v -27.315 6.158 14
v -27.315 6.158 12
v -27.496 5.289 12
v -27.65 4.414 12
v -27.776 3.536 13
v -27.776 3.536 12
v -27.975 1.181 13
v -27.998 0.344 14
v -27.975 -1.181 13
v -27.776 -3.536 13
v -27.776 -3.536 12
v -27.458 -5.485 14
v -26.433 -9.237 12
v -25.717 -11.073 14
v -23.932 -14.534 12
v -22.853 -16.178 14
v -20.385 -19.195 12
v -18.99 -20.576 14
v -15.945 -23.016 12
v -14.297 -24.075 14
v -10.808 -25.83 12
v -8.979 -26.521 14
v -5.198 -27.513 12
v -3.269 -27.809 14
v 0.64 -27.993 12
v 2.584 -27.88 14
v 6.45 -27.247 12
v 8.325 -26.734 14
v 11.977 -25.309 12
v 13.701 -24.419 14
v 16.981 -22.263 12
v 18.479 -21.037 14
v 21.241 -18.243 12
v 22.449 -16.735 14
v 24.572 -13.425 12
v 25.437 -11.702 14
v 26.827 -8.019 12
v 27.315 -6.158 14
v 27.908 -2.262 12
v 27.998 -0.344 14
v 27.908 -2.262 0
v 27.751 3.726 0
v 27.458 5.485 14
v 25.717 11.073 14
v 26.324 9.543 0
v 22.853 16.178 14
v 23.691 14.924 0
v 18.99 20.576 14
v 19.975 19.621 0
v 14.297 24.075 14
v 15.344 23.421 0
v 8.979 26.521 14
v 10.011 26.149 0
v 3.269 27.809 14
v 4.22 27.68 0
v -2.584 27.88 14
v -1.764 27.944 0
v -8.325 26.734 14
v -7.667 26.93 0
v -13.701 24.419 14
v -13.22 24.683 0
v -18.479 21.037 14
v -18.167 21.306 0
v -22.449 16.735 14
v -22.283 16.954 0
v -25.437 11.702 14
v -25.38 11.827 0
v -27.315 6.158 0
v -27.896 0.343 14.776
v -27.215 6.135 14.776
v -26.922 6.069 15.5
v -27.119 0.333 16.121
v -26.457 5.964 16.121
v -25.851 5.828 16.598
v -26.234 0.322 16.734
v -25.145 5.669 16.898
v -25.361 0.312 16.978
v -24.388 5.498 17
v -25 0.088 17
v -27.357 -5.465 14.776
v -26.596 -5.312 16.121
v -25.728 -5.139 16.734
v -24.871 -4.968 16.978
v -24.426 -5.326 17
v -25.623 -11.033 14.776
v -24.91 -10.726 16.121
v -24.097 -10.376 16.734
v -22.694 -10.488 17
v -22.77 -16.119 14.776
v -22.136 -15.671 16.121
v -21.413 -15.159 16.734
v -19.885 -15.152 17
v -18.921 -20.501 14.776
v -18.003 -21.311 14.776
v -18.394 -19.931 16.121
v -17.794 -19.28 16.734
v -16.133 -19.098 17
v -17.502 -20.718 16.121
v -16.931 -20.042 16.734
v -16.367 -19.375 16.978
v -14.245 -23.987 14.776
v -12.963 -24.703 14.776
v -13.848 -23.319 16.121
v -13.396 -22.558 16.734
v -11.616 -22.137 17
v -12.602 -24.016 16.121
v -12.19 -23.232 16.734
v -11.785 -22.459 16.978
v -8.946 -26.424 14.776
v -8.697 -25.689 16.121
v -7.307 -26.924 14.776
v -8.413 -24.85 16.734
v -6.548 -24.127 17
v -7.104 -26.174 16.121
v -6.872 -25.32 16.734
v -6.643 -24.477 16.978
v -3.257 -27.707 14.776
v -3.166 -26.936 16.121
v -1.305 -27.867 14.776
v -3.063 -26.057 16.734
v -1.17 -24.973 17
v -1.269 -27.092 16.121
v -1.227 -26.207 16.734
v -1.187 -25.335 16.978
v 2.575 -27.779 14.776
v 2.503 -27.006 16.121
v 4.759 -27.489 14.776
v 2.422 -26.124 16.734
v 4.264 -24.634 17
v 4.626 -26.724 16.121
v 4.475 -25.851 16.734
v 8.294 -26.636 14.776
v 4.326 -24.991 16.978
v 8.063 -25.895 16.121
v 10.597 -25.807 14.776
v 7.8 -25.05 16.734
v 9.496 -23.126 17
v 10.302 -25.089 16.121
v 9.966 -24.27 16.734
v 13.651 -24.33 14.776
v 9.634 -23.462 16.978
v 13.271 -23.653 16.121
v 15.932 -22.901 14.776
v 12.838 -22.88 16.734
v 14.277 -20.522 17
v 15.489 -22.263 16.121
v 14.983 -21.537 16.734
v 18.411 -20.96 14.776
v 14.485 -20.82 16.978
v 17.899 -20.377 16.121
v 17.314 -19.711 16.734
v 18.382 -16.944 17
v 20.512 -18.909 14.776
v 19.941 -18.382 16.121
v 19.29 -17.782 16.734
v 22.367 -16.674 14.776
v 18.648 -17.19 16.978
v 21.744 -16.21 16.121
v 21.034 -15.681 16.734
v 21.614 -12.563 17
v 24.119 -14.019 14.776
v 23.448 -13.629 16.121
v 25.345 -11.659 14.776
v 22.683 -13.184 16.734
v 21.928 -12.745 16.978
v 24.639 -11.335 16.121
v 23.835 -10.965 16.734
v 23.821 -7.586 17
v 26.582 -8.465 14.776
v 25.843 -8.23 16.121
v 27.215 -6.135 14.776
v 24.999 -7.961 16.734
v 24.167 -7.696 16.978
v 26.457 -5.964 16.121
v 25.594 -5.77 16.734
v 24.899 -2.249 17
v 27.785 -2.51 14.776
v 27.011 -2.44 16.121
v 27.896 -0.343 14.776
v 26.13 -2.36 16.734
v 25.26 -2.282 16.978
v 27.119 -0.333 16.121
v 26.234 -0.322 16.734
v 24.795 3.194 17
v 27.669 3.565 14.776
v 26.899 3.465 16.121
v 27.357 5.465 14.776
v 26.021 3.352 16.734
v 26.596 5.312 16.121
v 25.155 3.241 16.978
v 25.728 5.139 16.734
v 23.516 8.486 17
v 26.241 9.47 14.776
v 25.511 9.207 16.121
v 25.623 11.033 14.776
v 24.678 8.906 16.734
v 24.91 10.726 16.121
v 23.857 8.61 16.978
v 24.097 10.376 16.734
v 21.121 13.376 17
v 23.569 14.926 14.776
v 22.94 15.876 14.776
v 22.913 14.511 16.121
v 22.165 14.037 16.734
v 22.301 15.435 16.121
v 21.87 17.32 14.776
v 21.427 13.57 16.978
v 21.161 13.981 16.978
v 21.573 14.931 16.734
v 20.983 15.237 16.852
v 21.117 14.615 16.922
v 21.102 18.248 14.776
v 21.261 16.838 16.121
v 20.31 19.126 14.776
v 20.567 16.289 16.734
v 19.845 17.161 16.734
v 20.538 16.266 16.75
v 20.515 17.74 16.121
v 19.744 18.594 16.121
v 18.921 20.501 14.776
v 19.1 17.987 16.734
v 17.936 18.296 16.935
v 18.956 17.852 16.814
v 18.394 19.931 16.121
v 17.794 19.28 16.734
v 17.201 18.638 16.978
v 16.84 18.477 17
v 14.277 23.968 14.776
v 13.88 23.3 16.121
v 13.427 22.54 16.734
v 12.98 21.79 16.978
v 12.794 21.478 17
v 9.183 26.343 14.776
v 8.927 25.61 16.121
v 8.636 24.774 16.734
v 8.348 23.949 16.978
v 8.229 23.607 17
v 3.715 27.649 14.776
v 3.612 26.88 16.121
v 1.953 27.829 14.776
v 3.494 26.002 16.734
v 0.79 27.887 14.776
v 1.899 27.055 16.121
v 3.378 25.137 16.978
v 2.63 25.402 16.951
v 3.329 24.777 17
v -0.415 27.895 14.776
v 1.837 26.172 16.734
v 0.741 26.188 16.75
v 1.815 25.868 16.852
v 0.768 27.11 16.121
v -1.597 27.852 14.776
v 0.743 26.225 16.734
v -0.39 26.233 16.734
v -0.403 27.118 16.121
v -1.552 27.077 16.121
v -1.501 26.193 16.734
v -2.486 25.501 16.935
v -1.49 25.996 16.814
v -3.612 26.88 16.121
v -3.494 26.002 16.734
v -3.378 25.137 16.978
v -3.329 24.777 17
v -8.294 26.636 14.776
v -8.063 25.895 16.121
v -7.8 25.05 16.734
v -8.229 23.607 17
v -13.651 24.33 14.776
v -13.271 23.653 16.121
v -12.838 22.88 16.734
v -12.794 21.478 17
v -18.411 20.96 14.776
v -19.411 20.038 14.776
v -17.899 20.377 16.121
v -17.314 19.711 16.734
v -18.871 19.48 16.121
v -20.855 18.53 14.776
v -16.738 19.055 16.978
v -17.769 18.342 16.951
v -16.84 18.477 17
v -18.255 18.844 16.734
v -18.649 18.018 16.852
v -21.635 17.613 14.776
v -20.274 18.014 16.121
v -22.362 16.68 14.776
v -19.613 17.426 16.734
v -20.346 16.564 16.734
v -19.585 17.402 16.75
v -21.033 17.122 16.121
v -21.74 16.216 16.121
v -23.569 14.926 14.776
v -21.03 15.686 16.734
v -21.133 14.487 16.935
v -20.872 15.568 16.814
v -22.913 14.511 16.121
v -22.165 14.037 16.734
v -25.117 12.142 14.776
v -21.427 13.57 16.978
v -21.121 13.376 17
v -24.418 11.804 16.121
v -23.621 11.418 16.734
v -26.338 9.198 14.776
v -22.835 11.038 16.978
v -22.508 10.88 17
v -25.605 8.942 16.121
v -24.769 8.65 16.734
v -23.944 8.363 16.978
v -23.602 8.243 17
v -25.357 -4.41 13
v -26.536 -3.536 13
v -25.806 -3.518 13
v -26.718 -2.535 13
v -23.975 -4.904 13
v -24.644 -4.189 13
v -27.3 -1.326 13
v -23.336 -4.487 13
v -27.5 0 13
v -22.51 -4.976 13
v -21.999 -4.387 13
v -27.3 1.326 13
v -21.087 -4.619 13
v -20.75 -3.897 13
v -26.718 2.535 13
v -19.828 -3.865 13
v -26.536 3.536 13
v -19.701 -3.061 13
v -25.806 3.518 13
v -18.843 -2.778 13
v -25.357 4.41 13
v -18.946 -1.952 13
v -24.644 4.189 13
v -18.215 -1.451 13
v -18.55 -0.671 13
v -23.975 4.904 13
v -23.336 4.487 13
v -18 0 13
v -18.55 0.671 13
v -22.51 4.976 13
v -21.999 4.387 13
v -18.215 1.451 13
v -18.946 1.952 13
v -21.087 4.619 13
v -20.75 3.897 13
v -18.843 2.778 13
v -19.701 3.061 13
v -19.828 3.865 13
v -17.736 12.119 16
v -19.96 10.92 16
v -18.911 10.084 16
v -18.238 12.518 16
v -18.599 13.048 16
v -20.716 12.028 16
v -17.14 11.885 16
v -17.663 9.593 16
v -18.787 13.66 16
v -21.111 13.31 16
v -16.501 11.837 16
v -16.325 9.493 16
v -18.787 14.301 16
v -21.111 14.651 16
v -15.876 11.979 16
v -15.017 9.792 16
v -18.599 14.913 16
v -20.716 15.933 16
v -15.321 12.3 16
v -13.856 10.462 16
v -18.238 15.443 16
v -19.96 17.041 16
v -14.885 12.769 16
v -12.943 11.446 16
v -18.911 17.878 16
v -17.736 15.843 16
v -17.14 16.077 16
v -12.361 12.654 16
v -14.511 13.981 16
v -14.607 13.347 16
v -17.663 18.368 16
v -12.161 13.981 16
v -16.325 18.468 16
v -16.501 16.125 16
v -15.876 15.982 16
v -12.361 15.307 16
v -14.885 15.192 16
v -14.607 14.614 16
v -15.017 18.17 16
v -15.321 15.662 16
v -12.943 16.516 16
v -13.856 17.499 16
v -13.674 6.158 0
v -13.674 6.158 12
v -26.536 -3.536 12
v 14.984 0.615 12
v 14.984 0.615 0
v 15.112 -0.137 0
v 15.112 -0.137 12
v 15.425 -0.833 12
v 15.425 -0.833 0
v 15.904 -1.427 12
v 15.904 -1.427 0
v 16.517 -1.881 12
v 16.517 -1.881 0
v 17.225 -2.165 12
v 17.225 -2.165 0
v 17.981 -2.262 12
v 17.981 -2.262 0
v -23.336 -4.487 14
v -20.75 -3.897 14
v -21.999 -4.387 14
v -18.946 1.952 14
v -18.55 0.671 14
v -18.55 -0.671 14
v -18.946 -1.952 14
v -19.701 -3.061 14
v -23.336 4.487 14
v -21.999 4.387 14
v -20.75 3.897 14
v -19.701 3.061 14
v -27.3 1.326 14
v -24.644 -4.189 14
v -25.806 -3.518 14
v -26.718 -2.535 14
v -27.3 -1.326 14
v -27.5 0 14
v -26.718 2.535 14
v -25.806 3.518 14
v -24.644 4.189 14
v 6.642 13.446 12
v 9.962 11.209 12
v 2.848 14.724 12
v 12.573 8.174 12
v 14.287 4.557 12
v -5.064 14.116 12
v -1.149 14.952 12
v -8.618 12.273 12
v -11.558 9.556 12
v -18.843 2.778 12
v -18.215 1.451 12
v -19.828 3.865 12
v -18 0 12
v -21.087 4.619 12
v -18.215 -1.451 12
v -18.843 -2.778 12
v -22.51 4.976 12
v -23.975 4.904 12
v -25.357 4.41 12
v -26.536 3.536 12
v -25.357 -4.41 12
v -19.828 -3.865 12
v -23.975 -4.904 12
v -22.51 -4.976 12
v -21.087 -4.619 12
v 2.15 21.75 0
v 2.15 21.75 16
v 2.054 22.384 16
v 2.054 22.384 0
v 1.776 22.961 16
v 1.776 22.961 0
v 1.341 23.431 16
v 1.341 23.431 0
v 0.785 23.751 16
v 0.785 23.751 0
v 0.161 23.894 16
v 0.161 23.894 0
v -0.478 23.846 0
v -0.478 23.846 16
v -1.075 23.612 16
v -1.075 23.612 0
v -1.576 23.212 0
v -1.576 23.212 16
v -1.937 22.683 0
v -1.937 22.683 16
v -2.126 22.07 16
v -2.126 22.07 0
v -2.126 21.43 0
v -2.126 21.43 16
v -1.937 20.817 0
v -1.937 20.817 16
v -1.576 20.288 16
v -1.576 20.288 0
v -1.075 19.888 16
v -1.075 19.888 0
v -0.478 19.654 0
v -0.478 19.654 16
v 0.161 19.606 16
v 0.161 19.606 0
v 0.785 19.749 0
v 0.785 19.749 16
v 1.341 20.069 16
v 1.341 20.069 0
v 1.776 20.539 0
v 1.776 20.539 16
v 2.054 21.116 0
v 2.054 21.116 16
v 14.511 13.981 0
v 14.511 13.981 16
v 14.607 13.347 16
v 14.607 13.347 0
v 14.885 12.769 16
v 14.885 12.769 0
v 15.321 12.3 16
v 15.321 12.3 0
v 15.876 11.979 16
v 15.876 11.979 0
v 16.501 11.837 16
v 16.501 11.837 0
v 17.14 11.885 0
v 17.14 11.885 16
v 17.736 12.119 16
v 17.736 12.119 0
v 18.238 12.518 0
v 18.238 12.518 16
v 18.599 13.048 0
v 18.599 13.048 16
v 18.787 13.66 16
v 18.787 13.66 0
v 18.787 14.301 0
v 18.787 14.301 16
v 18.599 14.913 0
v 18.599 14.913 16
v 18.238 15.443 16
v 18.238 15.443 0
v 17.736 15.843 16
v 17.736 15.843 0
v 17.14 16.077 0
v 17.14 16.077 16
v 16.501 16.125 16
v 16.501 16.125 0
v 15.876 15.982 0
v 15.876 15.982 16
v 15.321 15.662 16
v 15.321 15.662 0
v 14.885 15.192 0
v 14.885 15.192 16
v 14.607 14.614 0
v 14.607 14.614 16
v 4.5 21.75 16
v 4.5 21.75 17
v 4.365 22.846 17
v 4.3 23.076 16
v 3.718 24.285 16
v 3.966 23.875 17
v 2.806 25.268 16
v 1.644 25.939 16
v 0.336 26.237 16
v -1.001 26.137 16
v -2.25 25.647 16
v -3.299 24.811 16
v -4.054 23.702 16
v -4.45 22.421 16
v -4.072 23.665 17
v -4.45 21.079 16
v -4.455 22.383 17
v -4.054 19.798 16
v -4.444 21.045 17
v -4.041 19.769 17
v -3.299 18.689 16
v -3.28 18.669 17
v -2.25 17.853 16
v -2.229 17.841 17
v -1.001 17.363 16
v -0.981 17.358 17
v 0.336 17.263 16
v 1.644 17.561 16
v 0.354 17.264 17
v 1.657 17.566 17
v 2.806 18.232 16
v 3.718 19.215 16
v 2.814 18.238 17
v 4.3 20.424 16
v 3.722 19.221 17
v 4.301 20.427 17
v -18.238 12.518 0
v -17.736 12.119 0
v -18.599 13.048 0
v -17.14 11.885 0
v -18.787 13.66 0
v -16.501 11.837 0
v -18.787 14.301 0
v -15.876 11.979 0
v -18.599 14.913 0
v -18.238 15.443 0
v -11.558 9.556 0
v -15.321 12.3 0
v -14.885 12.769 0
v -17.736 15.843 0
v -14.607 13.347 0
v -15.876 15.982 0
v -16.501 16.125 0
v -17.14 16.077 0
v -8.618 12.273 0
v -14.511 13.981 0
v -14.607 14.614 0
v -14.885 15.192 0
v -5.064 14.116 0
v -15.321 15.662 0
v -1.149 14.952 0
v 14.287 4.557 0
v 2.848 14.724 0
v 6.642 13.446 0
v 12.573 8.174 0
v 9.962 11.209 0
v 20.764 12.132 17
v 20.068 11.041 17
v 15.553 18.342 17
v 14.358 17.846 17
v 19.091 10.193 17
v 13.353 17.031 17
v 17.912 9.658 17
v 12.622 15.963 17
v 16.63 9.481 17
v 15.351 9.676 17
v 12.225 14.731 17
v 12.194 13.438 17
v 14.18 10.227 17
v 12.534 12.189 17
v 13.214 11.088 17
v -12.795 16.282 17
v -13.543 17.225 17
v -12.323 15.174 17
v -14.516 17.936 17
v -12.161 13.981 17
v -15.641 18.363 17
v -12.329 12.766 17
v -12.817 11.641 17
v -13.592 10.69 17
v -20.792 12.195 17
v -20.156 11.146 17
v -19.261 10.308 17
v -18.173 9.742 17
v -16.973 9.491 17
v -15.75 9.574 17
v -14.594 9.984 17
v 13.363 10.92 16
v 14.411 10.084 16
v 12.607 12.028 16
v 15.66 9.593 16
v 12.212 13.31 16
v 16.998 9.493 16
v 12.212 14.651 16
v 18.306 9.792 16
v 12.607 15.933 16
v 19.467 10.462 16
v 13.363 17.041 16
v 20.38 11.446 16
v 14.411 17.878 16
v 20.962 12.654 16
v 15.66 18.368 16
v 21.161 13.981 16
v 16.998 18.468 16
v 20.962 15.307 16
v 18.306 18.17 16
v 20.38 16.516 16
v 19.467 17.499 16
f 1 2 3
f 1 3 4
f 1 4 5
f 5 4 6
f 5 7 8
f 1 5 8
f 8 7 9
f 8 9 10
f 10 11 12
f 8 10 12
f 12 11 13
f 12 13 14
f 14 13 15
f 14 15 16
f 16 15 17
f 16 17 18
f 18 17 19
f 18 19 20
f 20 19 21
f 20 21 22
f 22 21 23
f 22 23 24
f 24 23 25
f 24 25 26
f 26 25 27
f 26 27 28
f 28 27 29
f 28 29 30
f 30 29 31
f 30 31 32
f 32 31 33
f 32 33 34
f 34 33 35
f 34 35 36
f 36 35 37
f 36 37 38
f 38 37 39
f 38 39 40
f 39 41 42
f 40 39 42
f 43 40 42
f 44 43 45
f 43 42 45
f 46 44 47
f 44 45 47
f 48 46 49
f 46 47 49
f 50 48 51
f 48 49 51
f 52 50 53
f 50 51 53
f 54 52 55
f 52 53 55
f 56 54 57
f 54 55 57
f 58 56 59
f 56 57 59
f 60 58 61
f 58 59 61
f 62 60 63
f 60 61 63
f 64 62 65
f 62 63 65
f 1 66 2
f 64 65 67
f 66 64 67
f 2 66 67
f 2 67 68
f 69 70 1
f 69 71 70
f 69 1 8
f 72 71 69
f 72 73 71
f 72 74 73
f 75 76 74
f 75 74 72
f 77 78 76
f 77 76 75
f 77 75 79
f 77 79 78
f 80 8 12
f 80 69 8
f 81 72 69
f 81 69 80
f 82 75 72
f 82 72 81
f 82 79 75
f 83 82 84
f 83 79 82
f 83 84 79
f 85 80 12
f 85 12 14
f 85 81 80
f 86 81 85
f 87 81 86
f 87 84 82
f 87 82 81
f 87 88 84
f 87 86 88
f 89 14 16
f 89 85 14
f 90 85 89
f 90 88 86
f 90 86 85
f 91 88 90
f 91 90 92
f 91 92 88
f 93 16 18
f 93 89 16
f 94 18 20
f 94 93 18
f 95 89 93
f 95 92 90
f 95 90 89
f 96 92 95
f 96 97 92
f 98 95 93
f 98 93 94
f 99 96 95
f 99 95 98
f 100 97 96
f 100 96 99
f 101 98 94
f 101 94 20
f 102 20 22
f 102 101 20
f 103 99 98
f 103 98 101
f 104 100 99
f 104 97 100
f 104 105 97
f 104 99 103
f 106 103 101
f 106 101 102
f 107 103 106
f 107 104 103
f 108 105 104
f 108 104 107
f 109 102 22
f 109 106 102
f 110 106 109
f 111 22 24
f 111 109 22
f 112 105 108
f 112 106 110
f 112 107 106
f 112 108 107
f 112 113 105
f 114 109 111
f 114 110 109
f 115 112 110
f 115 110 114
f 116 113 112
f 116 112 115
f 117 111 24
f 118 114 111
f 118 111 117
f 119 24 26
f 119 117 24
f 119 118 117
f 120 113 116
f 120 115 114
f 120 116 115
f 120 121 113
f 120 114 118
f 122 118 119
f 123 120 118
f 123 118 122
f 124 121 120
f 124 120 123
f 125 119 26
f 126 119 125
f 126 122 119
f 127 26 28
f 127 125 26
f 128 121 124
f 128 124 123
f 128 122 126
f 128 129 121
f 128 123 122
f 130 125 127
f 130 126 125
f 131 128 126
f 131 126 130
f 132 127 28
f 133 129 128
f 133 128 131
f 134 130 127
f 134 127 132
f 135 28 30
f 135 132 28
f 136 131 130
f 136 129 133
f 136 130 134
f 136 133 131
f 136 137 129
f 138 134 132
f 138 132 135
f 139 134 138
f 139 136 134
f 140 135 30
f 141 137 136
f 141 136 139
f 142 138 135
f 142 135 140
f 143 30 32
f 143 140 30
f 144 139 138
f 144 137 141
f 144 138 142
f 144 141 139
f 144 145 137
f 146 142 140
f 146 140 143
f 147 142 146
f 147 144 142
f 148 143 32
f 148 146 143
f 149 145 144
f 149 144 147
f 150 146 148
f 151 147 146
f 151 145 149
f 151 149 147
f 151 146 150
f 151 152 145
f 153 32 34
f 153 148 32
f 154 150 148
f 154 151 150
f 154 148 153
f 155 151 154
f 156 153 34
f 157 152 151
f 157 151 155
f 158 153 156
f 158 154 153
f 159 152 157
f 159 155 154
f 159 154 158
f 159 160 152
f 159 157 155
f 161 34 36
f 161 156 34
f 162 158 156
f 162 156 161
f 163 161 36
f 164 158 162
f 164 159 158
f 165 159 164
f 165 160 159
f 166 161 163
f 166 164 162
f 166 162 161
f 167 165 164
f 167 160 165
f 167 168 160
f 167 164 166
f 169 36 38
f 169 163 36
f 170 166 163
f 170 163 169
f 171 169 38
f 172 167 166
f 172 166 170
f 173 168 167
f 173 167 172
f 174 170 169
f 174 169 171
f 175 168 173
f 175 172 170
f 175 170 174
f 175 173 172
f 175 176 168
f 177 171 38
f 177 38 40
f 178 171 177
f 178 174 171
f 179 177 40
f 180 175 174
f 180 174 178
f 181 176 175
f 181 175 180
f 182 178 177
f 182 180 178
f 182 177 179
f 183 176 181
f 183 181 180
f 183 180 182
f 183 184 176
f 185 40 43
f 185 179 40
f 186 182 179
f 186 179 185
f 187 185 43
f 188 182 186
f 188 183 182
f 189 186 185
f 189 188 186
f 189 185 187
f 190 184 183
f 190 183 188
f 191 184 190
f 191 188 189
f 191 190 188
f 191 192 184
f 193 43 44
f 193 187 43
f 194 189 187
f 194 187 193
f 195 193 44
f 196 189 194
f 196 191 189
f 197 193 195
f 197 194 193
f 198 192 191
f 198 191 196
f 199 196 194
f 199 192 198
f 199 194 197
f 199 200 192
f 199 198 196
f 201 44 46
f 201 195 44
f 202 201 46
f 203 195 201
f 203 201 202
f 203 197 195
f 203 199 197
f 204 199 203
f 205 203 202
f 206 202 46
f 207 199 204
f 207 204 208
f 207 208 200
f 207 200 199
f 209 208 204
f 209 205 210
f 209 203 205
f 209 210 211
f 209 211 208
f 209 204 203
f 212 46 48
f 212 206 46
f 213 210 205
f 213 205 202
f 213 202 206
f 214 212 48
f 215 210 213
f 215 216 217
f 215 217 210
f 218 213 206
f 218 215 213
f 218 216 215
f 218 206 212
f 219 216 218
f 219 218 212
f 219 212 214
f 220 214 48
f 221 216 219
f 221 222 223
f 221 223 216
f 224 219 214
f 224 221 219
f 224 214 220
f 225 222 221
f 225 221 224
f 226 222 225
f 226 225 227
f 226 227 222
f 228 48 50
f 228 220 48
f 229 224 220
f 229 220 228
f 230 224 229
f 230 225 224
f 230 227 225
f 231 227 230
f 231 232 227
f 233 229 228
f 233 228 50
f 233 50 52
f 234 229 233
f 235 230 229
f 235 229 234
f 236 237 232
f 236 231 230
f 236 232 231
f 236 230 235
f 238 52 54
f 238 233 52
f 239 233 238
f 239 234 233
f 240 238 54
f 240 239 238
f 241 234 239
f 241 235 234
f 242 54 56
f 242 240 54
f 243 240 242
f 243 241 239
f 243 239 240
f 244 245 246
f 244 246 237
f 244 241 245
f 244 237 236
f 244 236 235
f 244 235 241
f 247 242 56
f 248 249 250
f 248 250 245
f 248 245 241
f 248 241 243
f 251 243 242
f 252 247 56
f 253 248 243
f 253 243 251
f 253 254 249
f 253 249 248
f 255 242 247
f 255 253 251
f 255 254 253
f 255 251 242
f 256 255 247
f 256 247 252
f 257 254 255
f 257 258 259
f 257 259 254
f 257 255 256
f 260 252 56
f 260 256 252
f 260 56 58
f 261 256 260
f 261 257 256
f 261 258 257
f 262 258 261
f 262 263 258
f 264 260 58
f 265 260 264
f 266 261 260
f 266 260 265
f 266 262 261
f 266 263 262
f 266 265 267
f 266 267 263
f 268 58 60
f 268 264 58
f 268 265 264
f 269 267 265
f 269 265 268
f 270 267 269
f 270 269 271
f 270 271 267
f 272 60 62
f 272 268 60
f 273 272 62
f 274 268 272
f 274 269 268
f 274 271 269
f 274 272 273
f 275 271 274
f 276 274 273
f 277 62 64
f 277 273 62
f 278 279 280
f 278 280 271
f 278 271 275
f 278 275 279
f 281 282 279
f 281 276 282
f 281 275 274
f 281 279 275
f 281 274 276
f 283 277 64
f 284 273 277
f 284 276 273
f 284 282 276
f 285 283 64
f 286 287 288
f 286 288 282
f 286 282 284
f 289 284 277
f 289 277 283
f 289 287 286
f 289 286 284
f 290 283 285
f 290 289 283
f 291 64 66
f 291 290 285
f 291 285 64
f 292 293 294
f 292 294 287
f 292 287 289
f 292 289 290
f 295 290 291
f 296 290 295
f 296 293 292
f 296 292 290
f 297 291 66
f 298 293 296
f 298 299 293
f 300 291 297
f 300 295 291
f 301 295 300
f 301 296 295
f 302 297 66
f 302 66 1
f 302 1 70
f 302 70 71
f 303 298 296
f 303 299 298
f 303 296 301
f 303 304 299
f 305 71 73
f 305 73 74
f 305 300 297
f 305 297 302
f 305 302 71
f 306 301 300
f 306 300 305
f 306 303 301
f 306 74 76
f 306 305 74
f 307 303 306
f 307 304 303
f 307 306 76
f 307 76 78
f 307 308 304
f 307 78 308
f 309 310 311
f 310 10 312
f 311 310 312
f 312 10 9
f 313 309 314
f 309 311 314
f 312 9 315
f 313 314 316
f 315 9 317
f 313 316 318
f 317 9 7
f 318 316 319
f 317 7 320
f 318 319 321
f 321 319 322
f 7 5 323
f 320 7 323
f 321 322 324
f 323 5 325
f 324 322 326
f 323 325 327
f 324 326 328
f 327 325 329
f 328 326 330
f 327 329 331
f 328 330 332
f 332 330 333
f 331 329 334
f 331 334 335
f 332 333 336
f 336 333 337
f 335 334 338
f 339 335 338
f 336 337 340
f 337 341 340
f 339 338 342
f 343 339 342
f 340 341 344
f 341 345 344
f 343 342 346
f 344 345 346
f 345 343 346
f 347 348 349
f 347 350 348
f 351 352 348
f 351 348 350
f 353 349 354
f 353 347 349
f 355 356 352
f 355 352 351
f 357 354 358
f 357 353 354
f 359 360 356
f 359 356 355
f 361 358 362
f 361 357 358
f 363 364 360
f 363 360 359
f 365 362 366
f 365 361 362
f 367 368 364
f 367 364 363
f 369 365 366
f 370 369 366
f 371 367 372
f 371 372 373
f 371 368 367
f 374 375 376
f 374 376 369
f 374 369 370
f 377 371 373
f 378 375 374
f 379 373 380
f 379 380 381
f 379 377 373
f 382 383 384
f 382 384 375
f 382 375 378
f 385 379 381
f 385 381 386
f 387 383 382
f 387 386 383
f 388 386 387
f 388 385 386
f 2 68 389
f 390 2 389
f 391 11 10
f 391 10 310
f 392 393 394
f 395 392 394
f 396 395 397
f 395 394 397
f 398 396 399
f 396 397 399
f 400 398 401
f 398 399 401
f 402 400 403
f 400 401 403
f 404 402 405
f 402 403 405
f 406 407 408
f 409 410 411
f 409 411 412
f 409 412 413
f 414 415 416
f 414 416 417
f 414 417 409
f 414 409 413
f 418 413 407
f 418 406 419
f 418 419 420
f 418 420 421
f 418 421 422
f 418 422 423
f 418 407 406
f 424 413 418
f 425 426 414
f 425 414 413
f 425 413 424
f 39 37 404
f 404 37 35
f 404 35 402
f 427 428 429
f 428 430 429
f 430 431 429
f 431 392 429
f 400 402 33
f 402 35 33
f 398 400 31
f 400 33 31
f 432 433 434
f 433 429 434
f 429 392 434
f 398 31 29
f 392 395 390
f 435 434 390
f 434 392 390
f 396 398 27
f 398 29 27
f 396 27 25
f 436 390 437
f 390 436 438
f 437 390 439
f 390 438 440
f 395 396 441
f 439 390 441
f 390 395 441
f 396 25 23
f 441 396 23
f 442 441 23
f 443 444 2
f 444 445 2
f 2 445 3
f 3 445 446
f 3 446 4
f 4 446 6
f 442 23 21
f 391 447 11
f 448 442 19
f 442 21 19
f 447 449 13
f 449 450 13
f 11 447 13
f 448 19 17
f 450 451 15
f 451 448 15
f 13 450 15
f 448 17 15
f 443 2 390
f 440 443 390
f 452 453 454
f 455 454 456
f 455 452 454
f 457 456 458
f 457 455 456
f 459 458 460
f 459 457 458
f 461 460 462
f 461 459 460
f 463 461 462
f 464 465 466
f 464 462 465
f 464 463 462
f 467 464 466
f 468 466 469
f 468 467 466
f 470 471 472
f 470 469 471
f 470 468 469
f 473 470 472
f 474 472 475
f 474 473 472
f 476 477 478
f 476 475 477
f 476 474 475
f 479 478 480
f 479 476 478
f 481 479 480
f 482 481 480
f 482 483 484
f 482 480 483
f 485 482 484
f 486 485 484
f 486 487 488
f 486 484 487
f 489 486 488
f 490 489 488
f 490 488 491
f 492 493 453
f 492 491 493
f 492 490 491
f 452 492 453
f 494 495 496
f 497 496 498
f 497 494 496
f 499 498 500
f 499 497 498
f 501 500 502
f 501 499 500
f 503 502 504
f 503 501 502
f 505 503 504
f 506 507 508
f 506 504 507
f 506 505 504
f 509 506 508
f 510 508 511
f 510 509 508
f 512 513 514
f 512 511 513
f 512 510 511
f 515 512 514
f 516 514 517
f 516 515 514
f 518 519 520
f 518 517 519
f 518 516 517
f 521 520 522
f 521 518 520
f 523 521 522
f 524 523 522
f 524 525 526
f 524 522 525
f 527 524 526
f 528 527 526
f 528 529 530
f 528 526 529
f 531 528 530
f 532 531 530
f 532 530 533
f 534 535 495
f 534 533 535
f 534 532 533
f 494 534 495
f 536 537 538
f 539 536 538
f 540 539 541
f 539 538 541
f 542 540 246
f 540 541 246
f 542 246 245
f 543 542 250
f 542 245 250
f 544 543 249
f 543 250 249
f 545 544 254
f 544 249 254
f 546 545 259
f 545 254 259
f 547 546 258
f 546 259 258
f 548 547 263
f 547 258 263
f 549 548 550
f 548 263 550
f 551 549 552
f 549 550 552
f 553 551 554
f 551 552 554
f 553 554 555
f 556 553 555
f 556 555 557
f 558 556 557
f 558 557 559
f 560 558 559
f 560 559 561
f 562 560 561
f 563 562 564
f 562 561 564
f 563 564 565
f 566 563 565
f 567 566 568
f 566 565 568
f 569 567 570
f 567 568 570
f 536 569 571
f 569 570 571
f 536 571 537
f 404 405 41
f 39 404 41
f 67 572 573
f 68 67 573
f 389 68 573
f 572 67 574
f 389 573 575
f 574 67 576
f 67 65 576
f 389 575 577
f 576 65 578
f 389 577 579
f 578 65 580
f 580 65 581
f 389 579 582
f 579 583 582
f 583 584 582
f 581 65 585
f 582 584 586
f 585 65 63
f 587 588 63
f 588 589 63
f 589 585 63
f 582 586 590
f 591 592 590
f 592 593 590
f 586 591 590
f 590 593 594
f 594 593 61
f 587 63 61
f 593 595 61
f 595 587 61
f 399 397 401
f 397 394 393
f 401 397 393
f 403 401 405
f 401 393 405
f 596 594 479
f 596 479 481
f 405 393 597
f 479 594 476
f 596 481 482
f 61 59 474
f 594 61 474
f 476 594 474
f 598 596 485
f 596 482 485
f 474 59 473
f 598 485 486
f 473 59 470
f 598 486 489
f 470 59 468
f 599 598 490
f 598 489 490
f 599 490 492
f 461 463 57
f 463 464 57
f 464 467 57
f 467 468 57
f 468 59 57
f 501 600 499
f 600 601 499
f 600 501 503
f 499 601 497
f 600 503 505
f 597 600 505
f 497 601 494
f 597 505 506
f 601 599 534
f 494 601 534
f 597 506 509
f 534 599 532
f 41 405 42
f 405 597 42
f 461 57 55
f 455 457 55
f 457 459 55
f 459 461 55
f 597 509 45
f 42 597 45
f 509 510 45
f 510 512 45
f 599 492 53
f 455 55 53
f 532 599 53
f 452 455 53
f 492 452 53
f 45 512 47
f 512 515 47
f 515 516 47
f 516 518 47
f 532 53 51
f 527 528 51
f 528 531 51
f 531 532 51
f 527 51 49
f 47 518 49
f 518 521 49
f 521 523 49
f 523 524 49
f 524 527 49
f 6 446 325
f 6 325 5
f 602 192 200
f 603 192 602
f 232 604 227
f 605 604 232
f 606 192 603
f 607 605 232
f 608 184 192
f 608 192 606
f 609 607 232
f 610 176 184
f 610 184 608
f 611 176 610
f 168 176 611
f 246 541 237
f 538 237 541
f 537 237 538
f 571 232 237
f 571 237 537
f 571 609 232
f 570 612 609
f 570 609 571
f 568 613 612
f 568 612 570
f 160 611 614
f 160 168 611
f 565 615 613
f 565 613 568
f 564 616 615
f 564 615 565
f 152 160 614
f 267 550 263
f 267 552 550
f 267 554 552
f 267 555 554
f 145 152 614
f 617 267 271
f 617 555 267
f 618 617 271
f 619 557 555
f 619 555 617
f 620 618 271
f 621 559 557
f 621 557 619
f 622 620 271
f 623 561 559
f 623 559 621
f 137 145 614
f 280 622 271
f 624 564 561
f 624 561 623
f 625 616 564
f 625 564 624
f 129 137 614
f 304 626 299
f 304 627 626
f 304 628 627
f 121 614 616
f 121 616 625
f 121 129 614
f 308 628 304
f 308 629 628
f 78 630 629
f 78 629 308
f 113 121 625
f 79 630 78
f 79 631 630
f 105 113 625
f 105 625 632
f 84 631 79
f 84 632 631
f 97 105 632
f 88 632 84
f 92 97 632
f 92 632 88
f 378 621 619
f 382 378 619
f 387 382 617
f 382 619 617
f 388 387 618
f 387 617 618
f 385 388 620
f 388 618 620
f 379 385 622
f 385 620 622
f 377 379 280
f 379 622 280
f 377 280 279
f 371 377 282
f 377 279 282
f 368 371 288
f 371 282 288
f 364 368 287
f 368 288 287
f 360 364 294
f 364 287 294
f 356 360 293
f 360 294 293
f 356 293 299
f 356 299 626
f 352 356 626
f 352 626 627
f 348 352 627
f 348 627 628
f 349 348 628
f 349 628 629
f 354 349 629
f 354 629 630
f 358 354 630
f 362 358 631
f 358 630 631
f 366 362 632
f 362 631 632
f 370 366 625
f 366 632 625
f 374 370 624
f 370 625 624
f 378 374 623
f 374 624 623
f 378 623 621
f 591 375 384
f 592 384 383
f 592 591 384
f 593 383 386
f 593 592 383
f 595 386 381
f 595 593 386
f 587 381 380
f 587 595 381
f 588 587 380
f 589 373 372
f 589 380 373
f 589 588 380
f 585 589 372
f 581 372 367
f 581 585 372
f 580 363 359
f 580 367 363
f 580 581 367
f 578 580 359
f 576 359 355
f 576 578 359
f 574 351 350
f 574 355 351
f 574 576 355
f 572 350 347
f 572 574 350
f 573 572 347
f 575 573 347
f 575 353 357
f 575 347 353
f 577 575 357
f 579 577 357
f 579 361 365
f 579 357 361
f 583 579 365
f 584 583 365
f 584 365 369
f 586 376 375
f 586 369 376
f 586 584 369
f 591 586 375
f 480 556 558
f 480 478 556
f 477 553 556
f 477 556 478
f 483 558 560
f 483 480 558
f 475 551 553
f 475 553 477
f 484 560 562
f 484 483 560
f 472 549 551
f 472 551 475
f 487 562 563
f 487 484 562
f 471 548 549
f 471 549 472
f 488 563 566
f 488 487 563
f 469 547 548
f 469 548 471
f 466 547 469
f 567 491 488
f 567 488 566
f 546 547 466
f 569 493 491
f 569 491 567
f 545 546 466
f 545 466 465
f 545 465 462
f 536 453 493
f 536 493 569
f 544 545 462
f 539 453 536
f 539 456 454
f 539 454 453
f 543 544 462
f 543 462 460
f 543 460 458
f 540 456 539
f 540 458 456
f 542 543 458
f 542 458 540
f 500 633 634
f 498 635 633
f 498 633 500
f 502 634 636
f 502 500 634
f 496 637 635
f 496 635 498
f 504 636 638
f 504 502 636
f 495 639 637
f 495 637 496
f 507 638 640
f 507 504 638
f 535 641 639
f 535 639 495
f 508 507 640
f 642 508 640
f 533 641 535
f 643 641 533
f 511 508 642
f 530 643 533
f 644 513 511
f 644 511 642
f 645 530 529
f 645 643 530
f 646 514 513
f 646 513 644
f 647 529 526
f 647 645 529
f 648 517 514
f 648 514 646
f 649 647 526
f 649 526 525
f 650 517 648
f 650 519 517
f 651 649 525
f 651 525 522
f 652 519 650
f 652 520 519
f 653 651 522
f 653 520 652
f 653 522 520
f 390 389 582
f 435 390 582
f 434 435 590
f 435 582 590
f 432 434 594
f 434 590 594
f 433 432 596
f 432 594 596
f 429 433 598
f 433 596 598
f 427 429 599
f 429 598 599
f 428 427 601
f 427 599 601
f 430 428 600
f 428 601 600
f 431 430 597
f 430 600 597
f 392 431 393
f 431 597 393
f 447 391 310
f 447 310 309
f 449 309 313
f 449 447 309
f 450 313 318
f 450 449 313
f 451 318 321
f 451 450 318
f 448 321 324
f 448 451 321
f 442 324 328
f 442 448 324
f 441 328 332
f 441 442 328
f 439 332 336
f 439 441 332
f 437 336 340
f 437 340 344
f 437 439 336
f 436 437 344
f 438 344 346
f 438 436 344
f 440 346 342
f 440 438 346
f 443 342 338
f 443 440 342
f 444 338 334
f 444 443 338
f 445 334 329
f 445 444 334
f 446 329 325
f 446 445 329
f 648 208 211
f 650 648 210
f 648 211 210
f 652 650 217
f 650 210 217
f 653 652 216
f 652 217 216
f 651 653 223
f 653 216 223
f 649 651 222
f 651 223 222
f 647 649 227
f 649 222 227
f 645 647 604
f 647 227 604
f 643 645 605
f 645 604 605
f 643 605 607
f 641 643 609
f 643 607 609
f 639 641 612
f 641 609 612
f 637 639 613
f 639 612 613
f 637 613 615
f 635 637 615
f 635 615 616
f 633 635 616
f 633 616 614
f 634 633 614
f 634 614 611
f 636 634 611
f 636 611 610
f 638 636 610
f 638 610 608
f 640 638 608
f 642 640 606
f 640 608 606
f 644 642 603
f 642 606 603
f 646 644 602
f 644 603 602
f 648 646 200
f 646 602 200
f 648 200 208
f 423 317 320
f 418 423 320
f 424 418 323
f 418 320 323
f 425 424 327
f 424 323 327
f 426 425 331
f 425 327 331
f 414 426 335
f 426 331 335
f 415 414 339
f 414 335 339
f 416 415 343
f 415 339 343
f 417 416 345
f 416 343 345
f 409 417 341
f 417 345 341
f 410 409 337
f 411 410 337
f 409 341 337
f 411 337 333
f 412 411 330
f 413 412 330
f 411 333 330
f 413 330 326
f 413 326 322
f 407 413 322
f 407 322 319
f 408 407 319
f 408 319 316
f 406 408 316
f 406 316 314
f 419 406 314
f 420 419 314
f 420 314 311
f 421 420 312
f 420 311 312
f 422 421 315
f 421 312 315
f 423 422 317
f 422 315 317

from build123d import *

# Parameters (mm, degrees)
SKETCH_1_R           = 28
EXTRUDE_1_DEPTH      = 15
CUT_EXTRUDE_START    = -22
CUT_EXTRUDE_1_DEPTH  = 22
EXTRUDE_2_DEPTH      = 2
EXTRUDE_2_DEPTH_BACK = 3
SKETCH_3_R           = 28
CUT_EXTRUDE_2_DEPTH  = 1
SKETCH_5_R           = 4.5
CUT_EXTRUDE_3_DEPTH  = 1
SKETCH_7_R           = 2.15
CUT_EXTRUDE_4_DEPTH  = 18
SKETCH_9_R           = 4.5
CUT_EXTRUDE_6_DEPTH  = 1
FILLET_5_R           = 3


with BuildPart() as part:
    # 草图1 → 凸台-拉伸1 (new body)
    with BuildSketch(Plane.XY):
        Circle(SKETCH_1_R)
    extrude(amount=EXTRUDE_1_DEPTH)

    # 草图2 → 切除-拉伸1 (cut)
    with BuildSketch(Plane.XY.offset(15).offset(CUT_EXTRUDE_START)):
        with BuildLine():
            Line((14.996539752, -0.000319471), (14.996539752, -2.262315411))
            Line((14.996539752, -2.262315411), (27.908456227, -2.262315411))
            ThreePointArc((27.908456227, -2.262315411), (-4.220435571, -27.680099776), (-27.314529778, 6.157634529))
            Line((-27.314529778, 6.157634529), (-13.674053592, 6.157634529))
            ThreePointArc((-13.674053592, 6.157634529), (3.149181128, 14.66215751), (14.996539752, -0.000319471))
        make_face()
    extrude(amount=CUT_EXTRUDE_1_DEPTH, mode=Mode.SUBTRACT)

    # 草图3 → 凸台-拉伸2 (add, two sides: drawn at the far end of the back side and taken through both)
    with BuildSketch(Plane.XY.offset(15).offset(-EXTRUDE_2_DEPTH_BACK)):
        with Locations(Location((0, 0, 0), (0, 0, 167.295928936))):
            Circle(SKETCH_3_R)
    extrude(amount=EXTRUDE_2_DEPTH + EXTRUDE_2_DEPTH_BACK)

    # 草图4 → 切除-拉伸2 (cut)
    with BuildSketch(Plane(origin=(0, 0, 12), x_dir=(-1, 0, 0), z_dir=(0, 0, -1))):
        with BuildLine():
            Line((26.535533906, 3.535533906), (27.775888825, 3.535533906))
            ThreePointArc((27.775888825, 3.535533906), (28, 0), (27.775888825, -3.535533906))
            Line((27.775888825, -3.535533906), (26.535533906, -3.535533906))
            ThreePointArc((26.535533906, -3.535533906), (18, 0), (26.535533906, 3.535533906))
        make_face()
    extrude(amount=-CUT_EXTRUDE_2_DEPTH, mode=Mode.SUBTRACT)

    # 草图5 → 切除-拉伸3 (cut)
    with BuildSketch(Plane(origin=(0, 0, 13), x_dir=(-1, 0, 0), z_dir=(0, 0, -1))):
        with Locations((23, 0)):
            Circle(SKETCH_5_R)
    extrude(amount=-CUT_EXTRUDE_3_DEPTH, mode=Mode.SUBTRACT)

    # 草图7 → 切除-拉伸4 (cut)
    with BuildSketch(Plane.XY):
        with Locations(Location((16.661466638, 13.980630511, 0), (0, 0, 180))):
            Circle(SKETCH_7_R)
        with Locations((-16.661466638, 13.980630511)):
            Circle(SKETCH_7_R)
        with Locations((0, 21.75)):
            Circle(SKETCH_7_R)
    extrude(amount=CUT_EXTRUDE_4_DEPTH, mode=Mode.SUBTRACT)

    # 草图9 → 切除-拉伸6 (cut)
    with BuildSketch(Plane.XY.offset(17)):
        with Locations((0, 21.75)):
            Circle(SKETCH_9_R)
        with Locations((16.661466638, 13.980630511)):
            Circle(SKETCH_9_R)
        with Locations((-16.661466638, 13.980630511)):
            Circle(SKETCH_9_R)
    extrude(amount=-CUT_EXTRUDE_6_DEPTH, mode=Mode.SUBTRACT)

    # 圆角5
    # the kernel refuses this fillet: 3 mm, written as the material it takes off along each edge
    with BuildSketch(Plane(origin=(14.996539752, -2.262315411, -7.462186675), x_dir=(1, 0, 0), z_dir=(0, 0, 1))) as fillet_5_piece_1:
        with BuildLine():
            CenterArc((2.98487467, 3), FILLET_5_R, 182.349232636, 87.650767364)
            Line((-0.012603956, 2.877028929), (-0.312351819, 2.864731822))
            ThreePointArc((-0.312351819, 2.864731822), (-0.3, 2.262002331), (-0.3, 0))
            Line((-0.3, 0), (0, -0.3))
            Line((0, -0.3), (2.98487467, -0.3))
            Line((2.98487467, -0.3), (2.98487467, 0))
        make_face()
    extrude(amount=19.462186675, mode=Mode.SUBTRACT)
    with BuildSketch(Plane(origin=(0, 0, 17), x_dir=(-0.9755189206474555, 0.21991551891311267, 0), z_dir=(0.21991551891311267, 0.9755189206474555, 0))) as fillet_5_piece_2:
        with BuildLine():
            CenterArc((28 - FILLET_5_R, -FILLET_5_R), FILLET_5_R, 0, 90)
            Line((28 - FILLET_5_R, 0), (28, 0))
            Line((28, 0), (28, -FILLET_5_R))
        make_face()
    revolve(axis=Axis((0, 0, 17), (0, 0, 1)), mode=Mode.SUBTRACT)


solid = part.part
